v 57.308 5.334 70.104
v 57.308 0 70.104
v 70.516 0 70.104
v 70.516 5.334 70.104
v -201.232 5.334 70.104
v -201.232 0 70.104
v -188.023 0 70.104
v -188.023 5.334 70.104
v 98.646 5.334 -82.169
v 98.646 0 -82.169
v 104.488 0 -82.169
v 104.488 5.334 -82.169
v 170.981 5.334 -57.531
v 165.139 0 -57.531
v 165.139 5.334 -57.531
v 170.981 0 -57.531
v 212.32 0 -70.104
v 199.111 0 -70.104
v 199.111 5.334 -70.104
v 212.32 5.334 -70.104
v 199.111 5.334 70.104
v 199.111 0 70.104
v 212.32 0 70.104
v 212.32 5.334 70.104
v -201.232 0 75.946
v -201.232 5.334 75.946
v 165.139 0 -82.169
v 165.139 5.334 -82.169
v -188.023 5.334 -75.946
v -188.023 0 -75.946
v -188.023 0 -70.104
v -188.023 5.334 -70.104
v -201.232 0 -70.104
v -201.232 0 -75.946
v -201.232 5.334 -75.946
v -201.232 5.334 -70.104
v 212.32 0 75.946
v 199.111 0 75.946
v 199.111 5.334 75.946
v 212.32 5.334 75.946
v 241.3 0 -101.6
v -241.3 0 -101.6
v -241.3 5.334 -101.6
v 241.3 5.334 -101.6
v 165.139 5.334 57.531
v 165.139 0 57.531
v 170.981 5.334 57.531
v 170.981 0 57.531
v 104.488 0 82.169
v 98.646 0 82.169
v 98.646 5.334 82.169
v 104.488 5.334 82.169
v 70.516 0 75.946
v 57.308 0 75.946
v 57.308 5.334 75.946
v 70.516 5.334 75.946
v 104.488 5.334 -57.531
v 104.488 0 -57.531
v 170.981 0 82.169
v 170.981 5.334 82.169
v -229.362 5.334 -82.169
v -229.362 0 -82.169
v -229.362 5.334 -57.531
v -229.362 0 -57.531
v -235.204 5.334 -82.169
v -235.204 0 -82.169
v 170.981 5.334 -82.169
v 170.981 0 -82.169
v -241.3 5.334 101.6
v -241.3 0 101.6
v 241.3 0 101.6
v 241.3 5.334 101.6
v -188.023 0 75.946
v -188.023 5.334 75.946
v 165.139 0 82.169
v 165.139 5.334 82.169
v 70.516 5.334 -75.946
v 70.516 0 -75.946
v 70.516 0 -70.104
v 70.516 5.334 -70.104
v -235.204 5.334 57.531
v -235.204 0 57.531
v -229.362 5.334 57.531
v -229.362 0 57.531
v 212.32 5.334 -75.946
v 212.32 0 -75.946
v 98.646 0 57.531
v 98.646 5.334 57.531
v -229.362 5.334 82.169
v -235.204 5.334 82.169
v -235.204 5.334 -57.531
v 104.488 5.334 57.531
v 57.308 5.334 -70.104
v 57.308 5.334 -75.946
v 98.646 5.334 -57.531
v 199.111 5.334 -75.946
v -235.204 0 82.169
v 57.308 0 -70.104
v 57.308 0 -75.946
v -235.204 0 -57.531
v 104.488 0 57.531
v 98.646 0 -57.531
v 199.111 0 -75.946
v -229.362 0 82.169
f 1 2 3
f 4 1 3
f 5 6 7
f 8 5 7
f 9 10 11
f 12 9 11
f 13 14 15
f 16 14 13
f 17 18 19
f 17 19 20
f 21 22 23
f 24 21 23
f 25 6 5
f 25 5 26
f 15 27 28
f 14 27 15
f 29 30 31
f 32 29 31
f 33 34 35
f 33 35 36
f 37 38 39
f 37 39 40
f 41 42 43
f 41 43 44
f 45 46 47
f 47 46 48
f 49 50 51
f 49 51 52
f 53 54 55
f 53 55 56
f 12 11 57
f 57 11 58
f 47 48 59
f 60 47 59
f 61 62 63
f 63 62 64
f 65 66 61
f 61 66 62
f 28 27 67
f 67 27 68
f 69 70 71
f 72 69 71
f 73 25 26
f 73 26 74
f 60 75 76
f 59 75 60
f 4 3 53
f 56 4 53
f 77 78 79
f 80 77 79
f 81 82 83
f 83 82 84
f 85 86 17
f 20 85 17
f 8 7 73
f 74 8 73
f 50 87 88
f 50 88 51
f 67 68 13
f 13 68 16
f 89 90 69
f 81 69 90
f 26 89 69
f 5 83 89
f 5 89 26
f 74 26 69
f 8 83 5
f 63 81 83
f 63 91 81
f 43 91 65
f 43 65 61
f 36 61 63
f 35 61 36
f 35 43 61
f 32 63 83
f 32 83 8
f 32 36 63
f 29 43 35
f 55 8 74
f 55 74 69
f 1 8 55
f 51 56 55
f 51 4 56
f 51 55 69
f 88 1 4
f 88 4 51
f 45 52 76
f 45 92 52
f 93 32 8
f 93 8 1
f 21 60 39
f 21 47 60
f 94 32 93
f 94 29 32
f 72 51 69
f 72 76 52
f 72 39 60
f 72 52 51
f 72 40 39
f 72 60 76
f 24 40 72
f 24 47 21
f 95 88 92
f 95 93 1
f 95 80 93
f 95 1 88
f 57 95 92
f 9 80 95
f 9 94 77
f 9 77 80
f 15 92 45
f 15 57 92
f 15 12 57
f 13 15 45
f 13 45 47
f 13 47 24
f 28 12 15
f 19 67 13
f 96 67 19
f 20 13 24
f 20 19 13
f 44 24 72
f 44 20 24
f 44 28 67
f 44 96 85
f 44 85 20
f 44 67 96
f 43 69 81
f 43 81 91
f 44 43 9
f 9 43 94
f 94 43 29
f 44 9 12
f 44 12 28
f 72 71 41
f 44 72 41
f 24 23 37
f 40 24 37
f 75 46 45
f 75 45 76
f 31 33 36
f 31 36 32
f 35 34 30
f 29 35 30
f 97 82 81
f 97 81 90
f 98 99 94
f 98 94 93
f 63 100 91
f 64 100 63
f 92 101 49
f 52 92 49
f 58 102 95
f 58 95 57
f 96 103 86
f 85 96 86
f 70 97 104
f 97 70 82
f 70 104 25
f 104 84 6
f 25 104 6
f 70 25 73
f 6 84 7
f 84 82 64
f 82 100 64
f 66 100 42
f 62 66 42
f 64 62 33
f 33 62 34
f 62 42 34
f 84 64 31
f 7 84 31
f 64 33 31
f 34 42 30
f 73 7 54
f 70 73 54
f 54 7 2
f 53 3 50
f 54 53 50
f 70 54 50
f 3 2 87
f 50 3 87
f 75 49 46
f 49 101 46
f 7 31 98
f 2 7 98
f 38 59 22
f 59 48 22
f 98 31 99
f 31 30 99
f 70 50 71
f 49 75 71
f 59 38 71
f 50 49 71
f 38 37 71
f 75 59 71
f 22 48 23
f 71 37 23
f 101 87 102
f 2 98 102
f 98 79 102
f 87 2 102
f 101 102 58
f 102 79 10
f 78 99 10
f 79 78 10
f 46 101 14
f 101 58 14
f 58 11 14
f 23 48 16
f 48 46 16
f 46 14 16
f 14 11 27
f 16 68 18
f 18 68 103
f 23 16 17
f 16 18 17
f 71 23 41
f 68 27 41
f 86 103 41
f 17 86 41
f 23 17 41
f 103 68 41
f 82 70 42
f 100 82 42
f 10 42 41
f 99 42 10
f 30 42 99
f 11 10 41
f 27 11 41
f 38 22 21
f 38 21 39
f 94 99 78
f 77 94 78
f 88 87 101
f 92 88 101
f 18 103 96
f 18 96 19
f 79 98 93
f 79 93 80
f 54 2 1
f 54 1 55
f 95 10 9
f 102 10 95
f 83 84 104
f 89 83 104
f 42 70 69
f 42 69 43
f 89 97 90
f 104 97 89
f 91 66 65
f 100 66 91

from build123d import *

# Parameters (mm, degrees)
SKETCH1_W           = 482.6
SKETCH1_H           = 203.2
BOSS_EXTRUDE1_DEPTH = 5.334
SKETCH5_W           = 5.842
SKETCH5_H           = 24.638
SKETCH5_W_2         = 13.208
SKETCH5_H_2         = 5.842
CUT_EXTRUDE3_DEPTH  = 262.871536361


with BuildPart() as part:
    # Sketch1 → Boss-Extrude1 (new body)
    with BuildSketch(Plane(origin=(0, 0, 0), x_dir=(1, 0, 0), z_dir=(0, 1, 0))):
        Rectangle(SKETCH1_W, SKETCH1_H)
    extrude(amount=BOSS_EXTRUDE1_DEPTH)

    # Sketch5 → Cut-Extrude3 (cut, through all)
    with BuildSketch(Plane.XZ):
        with Locations((-232.283, 69.85)):
            Rectangle(SKETCH5_W, SKETCH5_H)
        with Locations((101.567, 69.85)):
            Rectangle(SKETCH5_W, SKETCH5_H)
        with Locations((168.06, 69.85)):
            Rectangle(SKETCH5_W, SKETCH5_H)
        with Locations((168.06, -69.85)):
            Rectangle(SKETCH5_W, SKETCH5_H)
        with Locations((101.567, -69.85)):
            Rectangle(SKETCH5_W, SKETCH5_H)
        with Locations((-232.283, -69.85)):
            Rectangle(SKETCH5_W, SKETCH5_H)
        with Locations((63.9115, -73.025)):
            Rectangle(SKETCH5_W_2, SKETCH5_H_2)
        with Locations((-194.6275, -73.025)):
            Rectangle(SKETCH5_W_2, SKETCH5_H_2)
        with Locations((63.9115, 73.025)):
            Rectangle(SKETCH5_W_2, SKETCH5_H_2)
        with Locations((205.7155, -73.025)):
            Rectangle(SKETCH5_W_2, SKETCH5_H_2)
        with Locations((205.7155, 73.025)):
            Rectangle(SKETCH5_W_2, SKETCH5_H_2)
        with Locations((-194.6275, 73.025)):
            Rectangle(SKETCH5_W_2, SKETCH5_H_2)
    extrude(amount=-CUT_EXTRUDE3_DEPTH, mode=Mode.SUBTRACT)


solid = part.part
